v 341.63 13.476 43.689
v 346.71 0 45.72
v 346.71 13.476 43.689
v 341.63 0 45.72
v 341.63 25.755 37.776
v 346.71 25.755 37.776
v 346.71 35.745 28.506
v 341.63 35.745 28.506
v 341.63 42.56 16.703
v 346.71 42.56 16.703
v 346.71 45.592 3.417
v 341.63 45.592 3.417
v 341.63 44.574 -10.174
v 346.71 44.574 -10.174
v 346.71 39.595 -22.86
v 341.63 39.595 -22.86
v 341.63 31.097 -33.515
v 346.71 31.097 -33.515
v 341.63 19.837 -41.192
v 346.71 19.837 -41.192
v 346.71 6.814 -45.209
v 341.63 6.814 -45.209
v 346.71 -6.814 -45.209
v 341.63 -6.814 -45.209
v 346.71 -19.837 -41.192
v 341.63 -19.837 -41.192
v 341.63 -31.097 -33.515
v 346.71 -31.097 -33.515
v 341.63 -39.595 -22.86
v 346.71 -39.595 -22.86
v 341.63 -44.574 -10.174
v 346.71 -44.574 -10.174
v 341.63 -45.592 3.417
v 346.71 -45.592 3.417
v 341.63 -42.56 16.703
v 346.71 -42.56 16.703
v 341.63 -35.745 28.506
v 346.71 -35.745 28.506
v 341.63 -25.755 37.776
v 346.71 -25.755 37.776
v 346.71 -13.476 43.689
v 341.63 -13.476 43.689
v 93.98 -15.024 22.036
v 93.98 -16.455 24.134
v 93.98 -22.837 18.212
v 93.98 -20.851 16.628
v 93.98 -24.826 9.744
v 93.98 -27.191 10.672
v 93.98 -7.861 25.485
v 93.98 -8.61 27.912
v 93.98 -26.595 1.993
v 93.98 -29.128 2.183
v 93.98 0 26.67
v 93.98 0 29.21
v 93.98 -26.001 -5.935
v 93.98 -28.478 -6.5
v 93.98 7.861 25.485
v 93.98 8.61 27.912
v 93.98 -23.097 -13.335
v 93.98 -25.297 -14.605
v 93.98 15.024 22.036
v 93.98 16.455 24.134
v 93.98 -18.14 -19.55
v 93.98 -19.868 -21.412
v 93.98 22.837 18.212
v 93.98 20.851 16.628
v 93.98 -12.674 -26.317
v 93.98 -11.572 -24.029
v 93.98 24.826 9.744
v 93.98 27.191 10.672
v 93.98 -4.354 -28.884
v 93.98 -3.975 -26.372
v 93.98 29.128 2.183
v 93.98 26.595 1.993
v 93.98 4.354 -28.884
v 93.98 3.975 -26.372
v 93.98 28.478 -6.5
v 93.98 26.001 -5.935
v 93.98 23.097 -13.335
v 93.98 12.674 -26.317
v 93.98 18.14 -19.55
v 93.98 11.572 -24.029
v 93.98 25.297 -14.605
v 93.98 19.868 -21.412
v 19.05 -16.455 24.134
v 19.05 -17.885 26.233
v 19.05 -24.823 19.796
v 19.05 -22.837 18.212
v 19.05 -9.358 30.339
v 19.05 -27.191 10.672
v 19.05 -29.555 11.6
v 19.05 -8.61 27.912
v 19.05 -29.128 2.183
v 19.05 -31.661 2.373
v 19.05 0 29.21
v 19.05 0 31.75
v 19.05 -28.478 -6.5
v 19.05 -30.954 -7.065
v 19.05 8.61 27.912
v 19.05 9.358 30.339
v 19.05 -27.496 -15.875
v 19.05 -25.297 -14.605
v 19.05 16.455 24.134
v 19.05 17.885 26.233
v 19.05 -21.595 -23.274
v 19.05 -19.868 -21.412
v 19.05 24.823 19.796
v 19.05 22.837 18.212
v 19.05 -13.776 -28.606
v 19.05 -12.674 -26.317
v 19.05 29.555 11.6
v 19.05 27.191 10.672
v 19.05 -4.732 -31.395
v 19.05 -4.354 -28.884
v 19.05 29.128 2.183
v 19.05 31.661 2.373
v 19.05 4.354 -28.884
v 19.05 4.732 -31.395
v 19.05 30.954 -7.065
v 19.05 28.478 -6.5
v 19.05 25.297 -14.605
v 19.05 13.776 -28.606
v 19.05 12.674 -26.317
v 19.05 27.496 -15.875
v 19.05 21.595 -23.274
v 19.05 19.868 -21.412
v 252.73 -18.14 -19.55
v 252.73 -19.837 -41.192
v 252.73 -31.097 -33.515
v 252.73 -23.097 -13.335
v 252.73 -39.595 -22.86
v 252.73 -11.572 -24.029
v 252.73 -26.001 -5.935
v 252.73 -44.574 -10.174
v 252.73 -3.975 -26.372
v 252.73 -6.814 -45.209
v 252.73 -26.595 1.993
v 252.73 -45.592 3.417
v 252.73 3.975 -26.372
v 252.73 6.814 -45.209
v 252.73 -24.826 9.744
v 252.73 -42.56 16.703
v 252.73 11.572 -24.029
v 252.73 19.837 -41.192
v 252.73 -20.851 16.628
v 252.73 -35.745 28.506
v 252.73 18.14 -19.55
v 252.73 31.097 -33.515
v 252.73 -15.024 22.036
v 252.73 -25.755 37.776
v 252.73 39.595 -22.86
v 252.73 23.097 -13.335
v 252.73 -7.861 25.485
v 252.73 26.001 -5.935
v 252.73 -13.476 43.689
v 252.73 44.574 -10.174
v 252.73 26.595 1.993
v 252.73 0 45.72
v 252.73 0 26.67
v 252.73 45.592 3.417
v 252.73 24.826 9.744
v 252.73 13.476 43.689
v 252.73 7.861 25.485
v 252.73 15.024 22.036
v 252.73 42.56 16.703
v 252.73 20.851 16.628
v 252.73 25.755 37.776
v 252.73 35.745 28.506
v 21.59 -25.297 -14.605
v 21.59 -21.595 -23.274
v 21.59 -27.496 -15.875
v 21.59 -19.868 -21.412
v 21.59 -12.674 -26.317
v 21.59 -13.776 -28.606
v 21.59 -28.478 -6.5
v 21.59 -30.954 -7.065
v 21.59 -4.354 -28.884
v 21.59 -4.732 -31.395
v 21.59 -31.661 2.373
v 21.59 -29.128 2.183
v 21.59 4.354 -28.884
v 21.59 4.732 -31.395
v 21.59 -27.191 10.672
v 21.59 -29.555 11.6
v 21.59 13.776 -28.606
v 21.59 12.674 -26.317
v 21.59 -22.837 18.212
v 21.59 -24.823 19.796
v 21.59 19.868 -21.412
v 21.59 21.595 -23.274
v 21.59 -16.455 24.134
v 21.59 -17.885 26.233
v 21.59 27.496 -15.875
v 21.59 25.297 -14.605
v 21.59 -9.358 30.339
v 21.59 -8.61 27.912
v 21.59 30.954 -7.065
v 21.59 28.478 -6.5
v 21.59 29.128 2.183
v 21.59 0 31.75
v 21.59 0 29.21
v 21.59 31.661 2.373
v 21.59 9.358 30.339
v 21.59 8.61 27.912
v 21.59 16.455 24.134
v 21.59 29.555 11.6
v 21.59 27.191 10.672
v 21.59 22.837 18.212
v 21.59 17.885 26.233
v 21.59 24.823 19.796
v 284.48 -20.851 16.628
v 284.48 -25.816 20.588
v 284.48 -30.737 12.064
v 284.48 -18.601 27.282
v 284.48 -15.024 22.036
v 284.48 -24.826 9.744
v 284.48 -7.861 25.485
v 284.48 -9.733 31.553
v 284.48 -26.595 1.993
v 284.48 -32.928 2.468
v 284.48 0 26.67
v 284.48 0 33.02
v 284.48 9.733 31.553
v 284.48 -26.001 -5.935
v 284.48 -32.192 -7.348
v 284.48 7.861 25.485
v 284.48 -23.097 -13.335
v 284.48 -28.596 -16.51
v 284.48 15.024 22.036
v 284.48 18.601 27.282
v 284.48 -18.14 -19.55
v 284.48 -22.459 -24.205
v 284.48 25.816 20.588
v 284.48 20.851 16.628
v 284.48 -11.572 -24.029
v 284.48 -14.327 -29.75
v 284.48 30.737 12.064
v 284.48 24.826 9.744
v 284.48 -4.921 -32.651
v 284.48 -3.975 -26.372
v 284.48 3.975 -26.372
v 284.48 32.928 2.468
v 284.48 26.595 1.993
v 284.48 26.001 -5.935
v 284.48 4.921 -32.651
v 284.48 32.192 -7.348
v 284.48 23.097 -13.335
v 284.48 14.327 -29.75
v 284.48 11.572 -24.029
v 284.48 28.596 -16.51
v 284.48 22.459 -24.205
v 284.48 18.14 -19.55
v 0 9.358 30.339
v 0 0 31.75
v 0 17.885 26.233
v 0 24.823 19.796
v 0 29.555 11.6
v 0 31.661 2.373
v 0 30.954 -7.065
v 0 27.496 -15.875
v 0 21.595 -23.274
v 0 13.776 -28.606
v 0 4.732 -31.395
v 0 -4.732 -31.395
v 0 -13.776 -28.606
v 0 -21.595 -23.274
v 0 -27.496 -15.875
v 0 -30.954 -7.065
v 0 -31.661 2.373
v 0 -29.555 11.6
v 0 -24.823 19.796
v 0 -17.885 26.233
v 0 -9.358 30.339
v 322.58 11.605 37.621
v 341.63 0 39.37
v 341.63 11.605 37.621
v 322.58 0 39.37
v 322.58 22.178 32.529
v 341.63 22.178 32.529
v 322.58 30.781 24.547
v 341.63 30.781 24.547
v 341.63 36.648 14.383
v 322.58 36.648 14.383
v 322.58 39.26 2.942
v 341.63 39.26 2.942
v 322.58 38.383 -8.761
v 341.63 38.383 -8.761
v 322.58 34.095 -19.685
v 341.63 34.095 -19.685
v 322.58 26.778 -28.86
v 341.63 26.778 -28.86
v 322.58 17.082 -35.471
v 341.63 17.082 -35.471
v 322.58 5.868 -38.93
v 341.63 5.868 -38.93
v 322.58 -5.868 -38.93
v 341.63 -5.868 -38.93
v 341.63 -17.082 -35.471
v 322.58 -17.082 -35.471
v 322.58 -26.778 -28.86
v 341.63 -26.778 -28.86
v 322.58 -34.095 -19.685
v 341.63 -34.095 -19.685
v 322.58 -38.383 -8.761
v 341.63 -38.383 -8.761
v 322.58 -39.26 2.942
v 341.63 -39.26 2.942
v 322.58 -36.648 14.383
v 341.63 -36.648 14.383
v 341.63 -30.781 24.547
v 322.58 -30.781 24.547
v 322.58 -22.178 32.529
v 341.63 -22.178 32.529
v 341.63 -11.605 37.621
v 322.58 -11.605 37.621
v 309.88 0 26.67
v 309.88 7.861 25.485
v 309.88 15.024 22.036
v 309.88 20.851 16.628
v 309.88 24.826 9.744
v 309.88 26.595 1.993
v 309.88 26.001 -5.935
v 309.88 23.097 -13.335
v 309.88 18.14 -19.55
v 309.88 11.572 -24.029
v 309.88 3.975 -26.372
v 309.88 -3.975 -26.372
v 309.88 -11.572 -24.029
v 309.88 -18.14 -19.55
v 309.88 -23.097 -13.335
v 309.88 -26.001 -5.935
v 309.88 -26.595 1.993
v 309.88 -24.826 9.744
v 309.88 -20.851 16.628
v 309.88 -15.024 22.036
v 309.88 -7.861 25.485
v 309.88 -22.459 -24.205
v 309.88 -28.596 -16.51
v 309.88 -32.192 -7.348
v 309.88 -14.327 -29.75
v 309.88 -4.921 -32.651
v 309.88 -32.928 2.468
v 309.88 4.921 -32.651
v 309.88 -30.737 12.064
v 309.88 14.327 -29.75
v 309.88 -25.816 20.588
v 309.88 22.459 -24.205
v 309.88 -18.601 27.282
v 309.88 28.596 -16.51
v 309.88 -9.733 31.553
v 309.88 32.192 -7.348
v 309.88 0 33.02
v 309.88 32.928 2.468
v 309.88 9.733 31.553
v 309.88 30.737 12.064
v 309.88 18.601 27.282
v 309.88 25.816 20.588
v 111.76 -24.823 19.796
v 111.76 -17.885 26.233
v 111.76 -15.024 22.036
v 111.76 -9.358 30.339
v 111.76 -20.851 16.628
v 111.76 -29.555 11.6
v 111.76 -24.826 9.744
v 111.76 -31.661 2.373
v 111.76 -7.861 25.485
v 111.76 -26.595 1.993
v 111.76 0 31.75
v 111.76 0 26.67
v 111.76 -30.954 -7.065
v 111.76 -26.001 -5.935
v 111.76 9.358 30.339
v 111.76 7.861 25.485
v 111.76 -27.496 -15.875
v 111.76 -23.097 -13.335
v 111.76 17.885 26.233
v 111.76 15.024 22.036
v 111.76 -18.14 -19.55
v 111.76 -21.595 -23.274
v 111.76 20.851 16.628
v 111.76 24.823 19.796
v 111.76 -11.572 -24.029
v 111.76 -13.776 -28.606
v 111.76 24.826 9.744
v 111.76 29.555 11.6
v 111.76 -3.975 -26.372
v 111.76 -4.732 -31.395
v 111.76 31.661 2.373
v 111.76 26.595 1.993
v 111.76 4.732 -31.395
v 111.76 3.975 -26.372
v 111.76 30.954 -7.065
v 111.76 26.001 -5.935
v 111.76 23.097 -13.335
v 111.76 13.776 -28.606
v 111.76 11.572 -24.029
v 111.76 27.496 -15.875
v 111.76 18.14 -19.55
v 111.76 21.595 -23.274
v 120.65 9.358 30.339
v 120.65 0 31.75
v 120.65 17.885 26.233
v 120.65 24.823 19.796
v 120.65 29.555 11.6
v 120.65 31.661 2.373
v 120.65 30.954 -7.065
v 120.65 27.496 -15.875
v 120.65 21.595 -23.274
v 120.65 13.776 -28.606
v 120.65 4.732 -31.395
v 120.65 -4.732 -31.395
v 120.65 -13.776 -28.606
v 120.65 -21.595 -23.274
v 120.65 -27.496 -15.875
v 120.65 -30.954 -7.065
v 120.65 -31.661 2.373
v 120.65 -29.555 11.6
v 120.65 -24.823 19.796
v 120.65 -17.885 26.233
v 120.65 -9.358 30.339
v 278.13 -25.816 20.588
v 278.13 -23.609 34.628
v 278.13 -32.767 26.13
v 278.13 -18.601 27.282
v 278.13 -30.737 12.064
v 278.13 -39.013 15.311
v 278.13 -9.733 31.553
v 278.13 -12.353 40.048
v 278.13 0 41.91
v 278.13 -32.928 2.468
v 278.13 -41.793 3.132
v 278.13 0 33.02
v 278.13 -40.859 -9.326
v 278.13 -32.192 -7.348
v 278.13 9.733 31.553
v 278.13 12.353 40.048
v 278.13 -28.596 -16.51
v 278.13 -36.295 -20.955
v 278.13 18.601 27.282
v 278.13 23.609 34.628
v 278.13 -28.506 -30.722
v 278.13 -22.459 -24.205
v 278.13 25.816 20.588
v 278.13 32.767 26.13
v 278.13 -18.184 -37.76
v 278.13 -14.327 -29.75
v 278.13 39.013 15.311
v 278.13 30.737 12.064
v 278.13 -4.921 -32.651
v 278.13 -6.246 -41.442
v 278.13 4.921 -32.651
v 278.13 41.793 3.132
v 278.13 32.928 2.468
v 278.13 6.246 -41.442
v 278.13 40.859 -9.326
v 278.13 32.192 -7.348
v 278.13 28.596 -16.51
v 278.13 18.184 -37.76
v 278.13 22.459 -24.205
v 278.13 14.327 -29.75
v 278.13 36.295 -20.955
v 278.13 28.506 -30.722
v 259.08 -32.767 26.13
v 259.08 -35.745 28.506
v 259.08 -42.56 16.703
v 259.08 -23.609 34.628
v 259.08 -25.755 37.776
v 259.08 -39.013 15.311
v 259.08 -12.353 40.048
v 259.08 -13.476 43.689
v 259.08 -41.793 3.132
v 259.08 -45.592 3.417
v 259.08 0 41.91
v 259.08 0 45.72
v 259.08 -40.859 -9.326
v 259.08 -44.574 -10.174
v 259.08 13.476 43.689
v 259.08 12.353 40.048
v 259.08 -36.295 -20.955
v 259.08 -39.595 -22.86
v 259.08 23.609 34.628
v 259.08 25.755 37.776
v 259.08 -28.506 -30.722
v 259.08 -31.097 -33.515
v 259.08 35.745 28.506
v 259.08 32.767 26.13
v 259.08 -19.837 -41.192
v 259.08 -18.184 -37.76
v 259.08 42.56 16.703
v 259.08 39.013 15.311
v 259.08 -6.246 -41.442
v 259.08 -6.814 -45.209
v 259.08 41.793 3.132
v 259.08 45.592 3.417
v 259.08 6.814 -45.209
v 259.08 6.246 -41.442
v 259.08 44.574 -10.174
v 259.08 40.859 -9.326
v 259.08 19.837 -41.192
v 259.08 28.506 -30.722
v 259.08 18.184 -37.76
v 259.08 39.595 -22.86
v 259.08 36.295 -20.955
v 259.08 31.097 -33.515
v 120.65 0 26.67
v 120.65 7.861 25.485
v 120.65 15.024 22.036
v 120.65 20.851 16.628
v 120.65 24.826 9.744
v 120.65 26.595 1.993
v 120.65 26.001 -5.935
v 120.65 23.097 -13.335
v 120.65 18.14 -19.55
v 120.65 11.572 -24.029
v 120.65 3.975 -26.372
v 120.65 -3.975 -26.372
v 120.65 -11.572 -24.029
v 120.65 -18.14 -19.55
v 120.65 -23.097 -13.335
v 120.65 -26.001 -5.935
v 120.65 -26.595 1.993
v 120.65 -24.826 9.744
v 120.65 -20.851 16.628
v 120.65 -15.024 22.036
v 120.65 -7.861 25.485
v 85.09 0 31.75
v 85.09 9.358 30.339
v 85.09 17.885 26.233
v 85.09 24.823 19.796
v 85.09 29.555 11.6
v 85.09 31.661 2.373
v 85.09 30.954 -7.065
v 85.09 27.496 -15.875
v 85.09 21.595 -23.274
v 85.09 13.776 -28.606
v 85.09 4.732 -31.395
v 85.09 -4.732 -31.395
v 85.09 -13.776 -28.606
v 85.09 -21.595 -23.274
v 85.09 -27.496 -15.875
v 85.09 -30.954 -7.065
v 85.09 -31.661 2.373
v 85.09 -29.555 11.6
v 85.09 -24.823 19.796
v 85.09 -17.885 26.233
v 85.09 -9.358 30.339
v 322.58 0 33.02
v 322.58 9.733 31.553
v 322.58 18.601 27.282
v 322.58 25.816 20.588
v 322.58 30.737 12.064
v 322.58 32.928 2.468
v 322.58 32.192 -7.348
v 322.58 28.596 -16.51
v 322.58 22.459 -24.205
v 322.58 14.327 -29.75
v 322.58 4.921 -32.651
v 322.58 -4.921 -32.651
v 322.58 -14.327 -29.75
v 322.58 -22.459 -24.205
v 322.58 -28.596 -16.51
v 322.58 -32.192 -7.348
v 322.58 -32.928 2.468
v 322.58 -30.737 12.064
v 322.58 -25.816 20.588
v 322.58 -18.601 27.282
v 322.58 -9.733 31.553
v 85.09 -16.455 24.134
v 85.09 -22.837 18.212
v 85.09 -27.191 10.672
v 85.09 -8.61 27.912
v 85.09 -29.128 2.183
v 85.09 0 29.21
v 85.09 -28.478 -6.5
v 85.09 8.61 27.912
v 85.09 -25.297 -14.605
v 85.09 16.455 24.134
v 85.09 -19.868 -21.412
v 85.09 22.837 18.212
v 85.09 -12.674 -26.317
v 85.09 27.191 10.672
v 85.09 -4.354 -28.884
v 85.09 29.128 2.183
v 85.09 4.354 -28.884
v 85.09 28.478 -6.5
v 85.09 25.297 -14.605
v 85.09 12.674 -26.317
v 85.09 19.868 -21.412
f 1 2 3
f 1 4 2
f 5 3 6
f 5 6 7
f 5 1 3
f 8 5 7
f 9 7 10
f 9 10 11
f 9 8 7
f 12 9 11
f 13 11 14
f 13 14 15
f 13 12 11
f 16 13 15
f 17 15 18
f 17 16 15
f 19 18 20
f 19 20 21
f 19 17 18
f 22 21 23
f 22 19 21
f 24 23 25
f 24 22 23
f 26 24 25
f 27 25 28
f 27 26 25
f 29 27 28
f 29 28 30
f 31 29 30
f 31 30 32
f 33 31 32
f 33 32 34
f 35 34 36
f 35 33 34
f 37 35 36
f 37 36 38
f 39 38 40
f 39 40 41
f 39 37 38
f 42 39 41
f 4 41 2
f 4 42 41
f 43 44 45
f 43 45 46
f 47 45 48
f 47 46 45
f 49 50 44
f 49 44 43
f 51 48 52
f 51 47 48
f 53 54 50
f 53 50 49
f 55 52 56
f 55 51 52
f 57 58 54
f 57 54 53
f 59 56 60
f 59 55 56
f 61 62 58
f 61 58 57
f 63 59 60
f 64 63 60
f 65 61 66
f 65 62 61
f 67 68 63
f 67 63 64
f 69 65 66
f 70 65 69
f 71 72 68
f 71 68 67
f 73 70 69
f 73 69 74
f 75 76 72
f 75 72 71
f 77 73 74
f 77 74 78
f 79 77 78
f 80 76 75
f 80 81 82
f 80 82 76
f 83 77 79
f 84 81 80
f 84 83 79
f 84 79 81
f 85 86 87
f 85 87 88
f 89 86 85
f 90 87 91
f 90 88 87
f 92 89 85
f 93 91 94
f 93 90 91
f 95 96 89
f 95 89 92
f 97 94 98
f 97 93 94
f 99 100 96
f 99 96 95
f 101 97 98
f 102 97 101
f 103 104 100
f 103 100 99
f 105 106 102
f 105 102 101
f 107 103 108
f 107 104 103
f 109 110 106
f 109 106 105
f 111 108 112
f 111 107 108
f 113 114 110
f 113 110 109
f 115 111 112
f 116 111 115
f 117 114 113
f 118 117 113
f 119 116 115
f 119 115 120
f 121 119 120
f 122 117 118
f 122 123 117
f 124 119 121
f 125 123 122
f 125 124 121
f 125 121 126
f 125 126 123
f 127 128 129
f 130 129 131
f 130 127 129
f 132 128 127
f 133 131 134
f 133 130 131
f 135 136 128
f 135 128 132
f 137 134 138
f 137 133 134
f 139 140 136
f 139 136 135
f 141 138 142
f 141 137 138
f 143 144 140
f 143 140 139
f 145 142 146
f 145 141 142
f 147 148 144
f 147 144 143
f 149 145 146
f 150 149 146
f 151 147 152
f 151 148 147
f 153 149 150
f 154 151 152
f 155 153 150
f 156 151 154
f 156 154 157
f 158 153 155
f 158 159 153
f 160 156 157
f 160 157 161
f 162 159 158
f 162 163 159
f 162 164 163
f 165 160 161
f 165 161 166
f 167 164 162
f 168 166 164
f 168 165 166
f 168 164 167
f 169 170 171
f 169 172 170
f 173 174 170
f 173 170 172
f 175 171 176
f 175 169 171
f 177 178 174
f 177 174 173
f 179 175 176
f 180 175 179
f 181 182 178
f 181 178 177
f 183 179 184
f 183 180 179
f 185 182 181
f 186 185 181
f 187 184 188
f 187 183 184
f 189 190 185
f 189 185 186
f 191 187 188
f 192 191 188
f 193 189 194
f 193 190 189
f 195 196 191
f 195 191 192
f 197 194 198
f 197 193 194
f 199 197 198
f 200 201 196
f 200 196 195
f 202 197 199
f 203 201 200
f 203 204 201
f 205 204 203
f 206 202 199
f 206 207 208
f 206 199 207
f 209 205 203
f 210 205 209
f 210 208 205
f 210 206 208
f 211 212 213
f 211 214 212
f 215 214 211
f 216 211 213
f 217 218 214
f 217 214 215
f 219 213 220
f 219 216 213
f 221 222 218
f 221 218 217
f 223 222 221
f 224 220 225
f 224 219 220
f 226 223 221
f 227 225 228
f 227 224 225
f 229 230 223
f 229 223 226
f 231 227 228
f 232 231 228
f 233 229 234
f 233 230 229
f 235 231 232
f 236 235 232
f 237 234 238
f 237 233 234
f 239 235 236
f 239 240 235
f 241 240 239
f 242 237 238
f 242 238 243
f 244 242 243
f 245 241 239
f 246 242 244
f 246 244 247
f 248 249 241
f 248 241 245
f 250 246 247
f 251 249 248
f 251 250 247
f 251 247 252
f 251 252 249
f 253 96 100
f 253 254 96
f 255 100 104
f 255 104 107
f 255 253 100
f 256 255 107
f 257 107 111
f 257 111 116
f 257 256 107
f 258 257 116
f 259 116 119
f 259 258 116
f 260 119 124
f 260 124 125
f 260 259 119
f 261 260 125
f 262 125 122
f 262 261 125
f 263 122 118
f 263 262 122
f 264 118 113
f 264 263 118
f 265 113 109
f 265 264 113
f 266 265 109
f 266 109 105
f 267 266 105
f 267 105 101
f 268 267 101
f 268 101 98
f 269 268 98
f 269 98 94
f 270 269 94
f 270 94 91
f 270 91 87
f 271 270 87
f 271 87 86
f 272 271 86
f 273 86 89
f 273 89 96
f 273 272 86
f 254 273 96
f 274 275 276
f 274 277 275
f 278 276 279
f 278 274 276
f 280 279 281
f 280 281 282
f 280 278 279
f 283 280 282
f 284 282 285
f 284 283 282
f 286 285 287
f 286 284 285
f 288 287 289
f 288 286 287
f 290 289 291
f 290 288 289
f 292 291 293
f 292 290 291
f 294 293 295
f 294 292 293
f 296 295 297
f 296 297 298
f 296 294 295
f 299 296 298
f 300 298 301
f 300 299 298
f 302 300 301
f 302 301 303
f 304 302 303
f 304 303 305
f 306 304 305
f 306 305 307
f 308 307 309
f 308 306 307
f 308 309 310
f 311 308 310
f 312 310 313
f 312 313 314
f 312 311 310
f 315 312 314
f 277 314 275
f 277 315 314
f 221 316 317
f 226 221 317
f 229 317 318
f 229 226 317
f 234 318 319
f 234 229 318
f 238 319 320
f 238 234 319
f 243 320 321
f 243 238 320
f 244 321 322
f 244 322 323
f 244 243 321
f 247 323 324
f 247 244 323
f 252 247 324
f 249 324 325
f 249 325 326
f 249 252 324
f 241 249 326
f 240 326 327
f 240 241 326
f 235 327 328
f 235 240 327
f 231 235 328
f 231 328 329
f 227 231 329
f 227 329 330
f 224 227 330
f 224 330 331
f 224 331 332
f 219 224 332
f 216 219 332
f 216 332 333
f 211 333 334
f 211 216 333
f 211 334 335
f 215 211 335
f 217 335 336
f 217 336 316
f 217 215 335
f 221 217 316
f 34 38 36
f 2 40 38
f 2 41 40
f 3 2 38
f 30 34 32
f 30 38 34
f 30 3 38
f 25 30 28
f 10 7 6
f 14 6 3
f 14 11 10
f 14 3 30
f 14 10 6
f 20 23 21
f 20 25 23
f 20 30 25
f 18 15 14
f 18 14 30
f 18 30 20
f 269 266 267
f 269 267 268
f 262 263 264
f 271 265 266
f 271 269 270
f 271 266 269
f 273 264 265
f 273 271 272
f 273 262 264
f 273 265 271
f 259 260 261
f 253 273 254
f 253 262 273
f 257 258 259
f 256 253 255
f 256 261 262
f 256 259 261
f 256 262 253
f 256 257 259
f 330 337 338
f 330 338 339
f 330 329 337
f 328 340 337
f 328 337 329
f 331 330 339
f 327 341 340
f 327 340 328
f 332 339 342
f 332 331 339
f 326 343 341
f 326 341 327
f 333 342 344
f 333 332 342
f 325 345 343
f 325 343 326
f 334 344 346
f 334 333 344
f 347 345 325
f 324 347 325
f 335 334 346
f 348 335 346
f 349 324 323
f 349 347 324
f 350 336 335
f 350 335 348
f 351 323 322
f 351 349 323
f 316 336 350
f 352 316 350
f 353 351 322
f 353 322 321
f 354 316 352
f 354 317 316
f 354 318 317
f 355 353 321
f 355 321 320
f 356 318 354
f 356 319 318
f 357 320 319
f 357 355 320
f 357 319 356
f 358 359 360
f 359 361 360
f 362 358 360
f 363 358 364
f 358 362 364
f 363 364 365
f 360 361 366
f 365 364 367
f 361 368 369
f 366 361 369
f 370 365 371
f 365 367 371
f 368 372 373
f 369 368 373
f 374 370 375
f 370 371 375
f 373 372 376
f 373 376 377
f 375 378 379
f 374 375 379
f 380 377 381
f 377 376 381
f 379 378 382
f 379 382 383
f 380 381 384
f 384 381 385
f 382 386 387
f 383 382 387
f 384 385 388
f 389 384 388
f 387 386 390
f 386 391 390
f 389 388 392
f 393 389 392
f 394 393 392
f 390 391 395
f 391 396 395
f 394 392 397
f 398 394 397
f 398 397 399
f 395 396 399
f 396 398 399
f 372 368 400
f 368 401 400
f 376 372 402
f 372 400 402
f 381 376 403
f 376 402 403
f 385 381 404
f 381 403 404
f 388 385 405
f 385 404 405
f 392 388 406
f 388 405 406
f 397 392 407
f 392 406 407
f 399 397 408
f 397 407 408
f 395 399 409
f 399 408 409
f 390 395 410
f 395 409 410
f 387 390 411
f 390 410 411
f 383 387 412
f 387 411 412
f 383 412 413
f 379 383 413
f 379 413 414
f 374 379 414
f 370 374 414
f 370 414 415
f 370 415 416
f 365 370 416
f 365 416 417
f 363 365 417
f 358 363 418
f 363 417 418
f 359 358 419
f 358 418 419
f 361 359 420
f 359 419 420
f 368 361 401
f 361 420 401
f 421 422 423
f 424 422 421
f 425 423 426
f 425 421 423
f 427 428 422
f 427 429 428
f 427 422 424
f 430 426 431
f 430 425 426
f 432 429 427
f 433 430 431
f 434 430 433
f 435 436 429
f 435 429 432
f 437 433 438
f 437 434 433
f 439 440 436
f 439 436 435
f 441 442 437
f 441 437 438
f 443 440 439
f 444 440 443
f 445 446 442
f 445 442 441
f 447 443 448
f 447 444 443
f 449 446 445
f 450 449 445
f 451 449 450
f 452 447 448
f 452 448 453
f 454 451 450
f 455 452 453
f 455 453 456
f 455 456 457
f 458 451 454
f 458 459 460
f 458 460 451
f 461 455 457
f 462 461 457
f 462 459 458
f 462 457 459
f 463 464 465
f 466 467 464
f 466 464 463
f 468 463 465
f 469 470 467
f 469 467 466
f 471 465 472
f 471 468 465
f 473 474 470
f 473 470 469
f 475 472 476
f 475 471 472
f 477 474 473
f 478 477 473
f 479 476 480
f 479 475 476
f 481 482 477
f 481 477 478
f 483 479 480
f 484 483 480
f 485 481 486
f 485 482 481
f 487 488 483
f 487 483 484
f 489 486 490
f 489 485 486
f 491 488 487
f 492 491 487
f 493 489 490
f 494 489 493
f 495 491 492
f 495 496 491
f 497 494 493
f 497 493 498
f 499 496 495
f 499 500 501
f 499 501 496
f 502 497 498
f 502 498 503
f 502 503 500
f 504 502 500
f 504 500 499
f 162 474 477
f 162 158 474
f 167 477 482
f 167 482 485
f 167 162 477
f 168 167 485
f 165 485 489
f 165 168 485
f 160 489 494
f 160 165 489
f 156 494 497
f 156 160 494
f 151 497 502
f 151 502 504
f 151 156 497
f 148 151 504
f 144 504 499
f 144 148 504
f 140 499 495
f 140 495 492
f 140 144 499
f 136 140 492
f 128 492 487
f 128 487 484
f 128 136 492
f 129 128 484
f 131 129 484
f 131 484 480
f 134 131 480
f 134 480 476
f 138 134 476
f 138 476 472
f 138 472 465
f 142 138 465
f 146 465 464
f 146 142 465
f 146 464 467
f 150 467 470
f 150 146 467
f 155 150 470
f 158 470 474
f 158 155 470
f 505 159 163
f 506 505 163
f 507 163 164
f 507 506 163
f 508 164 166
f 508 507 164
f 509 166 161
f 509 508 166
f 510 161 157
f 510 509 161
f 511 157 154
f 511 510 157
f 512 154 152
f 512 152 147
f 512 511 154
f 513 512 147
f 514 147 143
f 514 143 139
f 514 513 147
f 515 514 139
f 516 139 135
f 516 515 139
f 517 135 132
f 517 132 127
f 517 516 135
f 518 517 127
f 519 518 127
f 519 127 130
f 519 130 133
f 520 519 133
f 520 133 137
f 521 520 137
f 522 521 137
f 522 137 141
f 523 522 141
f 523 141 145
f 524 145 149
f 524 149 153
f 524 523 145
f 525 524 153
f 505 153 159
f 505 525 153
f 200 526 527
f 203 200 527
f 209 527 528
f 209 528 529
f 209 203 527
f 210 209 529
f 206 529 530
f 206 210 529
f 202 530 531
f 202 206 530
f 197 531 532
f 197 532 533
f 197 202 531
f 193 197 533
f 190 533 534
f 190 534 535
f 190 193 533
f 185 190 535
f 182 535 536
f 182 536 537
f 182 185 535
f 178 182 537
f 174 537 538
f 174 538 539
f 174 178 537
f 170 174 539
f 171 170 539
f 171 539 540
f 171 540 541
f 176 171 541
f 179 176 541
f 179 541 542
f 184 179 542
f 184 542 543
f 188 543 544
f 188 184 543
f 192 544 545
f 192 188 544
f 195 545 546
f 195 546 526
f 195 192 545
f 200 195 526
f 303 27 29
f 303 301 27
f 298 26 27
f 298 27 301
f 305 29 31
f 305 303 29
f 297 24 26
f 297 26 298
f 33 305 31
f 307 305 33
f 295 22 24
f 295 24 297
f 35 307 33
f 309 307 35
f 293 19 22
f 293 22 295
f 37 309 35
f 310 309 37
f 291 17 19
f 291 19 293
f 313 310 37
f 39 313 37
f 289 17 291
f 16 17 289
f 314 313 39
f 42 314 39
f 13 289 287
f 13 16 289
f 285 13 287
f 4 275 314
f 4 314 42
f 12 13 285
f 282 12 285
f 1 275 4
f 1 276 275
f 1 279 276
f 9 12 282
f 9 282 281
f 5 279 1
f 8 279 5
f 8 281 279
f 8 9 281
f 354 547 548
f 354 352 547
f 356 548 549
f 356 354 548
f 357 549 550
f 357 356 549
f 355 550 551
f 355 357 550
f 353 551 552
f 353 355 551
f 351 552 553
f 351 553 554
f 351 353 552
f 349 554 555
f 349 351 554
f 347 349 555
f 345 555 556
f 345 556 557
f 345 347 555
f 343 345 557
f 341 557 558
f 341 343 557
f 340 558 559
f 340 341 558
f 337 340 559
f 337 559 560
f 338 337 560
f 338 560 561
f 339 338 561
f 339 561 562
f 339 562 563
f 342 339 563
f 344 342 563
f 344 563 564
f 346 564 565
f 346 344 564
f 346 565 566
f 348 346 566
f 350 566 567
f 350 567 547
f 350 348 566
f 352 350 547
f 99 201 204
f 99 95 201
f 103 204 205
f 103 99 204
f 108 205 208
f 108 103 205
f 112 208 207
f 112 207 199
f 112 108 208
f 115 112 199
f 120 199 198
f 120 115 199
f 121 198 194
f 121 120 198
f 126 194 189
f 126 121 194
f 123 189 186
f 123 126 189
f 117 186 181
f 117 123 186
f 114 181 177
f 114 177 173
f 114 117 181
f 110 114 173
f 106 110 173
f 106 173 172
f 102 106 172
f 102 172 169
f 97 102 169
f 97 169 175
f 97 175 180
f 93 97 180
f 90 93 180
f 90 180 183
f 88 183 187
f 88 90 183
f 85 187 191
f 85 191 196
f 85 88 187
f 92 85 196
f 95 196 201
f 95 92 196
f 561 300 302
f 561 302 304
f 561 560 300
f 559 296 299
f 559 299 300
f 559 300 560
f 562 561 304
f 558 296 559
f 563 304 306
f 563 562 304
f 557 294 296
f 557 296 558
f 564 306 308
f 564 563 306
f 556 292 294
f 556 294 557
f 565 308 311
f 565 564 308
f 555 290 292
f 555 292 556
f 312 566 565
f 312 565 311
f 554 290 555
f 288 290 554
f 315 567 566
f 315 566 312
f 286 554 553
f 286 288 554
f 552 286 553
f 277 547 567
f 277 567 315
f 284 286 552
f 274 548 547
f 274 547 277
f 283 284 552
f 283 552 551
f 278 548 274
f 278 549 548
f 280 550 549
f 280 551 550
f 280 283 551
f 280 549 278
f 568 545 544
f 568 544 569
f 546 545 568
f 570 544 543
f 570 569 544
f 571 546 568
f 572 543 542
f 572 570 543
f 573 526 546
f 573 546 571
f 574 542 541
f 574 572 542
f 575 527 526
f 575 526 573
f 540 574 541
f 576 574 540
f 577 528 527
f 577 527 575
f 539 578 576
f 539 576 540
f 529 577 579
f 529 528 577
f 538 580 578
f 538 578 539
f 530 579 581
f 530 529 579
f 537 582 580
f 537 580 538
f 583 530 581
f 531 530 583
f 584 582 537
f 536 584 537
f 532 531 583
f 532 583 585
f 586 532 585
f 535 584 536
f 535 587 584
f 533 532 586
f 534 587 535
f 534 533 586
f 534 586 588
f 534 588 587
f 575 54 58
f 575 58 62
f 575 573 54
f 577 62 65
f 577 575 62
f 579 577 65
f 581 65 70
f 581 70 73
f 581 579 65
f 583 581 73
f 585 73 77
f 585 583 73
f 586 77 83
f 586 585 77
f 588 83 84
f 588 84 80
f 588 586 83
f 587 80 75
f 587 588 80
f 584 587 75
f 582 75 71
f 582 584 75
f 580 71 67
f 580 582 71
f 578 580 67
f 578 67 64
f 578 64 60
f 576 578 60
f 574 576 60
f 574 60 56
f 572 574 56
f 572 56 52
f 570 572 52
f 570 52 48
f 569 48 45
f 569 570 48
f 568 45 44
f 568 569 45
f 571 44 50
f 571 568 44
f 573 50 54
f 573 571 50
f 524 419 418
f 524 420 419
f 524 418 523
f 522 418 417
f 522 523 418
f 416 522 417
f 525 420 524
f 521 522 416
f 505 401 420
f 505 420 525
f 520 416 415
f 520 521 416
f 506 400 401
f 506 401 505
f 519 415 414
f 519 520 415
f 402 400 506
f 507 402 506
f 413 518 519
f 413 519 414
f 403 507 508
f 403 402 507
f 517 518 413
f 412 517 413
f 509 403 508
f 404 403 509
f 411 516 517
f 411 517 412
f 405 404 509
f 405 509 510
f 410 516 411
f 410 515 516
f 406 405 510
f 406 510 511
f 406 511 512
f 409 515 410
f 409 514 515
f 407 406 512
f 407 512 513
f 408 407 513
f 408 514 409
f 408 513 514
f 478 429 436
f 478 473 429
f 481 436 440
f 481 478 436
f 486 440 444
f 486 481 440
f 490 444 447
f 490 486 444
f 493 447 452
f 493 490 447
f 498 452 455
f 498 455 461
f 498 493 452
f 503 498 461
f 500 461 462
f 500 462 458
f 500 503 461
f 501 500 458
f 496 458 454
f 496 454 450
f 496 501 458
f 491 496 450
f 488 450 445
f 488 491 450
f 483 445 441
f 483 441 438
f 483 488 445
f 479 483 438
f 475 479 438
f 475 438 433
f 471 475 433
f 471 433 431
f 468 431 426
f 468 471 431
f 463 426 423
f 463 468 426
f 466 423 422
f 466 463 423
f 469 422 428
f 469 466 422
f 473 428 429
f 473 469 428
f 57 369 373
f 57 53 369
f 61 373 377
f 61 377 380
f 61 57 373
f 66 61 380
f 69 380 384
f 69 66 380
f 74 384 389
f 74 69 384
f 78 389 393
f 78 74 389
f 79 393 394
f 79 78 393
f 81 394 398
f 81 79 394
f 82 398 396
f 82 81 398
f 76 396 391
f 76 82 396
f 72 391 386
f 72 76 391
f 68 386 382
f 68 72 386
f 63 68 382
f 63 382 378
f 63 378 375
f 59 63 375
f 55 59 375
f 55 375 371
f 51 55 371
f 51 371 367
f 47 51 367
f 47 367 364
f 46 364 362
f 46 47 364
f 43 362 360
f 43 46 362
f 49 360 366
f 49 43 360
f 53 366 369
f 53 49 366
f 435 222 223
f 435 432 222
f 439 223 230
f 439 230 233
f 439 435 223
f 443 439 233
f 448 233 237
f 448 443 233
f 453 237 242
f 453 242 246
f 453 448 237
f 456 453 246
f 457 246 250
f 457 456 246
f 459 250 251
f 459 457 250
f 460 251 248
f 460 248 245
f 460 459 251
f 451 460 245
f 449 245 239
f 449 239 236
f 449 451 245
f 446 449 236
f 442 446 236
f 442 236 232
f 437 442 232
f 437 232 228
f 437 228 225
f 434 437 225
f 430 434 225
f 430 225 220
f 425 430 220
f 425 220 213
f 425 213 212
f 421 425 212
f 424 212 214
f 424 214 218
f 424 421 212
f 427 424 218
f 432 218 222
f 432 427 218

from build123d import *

# Parameters (mm, degrees)
F2_W = 8.89
F2_H = 5.08


with BuildPart() as f1:
    # F0 (on Front) → F1 (revolve)
    with BuildSketch(Plane.XZ):
        Polygon((19.05, 31.75), (0, 31.75), (0, 0), (346.71, 0), (346.71, 45.72), (341.63, 45.72), (341.63, 39.37), (322.58, 39.37), (322.58, 33.02), (309.88, 33.02), (309.88, 26.67), (284.48, 26.67), (284.48, 33.02), (278.13, 33.02), (278.13, 41.91), (259.08, 41.91), (259.08, 45.72), (252.73, 45.72), (252.73, 26.67), (100.33, 26.67), (93.98, 26.67), (93.98, 29.21), (85.09, 29.21), (85.09, 31.75), (21.59, 31.75), (21.59, 29.21), (19.05, 29.21), align=None)
    revolve(axis=Axis((173.355, 0, 0), (-1, 0, 0)))

    # F2 (on Front) → F3 (revolve)
    with BuildSketch(Plane.XZ):
        with Locations((116.205, 29.21)):
            Rectangle(F2_W, F2_H)
    revolve(axis=Axis((173.355, 0, 0), (-1, 0, 0)))


solid = f1.part
